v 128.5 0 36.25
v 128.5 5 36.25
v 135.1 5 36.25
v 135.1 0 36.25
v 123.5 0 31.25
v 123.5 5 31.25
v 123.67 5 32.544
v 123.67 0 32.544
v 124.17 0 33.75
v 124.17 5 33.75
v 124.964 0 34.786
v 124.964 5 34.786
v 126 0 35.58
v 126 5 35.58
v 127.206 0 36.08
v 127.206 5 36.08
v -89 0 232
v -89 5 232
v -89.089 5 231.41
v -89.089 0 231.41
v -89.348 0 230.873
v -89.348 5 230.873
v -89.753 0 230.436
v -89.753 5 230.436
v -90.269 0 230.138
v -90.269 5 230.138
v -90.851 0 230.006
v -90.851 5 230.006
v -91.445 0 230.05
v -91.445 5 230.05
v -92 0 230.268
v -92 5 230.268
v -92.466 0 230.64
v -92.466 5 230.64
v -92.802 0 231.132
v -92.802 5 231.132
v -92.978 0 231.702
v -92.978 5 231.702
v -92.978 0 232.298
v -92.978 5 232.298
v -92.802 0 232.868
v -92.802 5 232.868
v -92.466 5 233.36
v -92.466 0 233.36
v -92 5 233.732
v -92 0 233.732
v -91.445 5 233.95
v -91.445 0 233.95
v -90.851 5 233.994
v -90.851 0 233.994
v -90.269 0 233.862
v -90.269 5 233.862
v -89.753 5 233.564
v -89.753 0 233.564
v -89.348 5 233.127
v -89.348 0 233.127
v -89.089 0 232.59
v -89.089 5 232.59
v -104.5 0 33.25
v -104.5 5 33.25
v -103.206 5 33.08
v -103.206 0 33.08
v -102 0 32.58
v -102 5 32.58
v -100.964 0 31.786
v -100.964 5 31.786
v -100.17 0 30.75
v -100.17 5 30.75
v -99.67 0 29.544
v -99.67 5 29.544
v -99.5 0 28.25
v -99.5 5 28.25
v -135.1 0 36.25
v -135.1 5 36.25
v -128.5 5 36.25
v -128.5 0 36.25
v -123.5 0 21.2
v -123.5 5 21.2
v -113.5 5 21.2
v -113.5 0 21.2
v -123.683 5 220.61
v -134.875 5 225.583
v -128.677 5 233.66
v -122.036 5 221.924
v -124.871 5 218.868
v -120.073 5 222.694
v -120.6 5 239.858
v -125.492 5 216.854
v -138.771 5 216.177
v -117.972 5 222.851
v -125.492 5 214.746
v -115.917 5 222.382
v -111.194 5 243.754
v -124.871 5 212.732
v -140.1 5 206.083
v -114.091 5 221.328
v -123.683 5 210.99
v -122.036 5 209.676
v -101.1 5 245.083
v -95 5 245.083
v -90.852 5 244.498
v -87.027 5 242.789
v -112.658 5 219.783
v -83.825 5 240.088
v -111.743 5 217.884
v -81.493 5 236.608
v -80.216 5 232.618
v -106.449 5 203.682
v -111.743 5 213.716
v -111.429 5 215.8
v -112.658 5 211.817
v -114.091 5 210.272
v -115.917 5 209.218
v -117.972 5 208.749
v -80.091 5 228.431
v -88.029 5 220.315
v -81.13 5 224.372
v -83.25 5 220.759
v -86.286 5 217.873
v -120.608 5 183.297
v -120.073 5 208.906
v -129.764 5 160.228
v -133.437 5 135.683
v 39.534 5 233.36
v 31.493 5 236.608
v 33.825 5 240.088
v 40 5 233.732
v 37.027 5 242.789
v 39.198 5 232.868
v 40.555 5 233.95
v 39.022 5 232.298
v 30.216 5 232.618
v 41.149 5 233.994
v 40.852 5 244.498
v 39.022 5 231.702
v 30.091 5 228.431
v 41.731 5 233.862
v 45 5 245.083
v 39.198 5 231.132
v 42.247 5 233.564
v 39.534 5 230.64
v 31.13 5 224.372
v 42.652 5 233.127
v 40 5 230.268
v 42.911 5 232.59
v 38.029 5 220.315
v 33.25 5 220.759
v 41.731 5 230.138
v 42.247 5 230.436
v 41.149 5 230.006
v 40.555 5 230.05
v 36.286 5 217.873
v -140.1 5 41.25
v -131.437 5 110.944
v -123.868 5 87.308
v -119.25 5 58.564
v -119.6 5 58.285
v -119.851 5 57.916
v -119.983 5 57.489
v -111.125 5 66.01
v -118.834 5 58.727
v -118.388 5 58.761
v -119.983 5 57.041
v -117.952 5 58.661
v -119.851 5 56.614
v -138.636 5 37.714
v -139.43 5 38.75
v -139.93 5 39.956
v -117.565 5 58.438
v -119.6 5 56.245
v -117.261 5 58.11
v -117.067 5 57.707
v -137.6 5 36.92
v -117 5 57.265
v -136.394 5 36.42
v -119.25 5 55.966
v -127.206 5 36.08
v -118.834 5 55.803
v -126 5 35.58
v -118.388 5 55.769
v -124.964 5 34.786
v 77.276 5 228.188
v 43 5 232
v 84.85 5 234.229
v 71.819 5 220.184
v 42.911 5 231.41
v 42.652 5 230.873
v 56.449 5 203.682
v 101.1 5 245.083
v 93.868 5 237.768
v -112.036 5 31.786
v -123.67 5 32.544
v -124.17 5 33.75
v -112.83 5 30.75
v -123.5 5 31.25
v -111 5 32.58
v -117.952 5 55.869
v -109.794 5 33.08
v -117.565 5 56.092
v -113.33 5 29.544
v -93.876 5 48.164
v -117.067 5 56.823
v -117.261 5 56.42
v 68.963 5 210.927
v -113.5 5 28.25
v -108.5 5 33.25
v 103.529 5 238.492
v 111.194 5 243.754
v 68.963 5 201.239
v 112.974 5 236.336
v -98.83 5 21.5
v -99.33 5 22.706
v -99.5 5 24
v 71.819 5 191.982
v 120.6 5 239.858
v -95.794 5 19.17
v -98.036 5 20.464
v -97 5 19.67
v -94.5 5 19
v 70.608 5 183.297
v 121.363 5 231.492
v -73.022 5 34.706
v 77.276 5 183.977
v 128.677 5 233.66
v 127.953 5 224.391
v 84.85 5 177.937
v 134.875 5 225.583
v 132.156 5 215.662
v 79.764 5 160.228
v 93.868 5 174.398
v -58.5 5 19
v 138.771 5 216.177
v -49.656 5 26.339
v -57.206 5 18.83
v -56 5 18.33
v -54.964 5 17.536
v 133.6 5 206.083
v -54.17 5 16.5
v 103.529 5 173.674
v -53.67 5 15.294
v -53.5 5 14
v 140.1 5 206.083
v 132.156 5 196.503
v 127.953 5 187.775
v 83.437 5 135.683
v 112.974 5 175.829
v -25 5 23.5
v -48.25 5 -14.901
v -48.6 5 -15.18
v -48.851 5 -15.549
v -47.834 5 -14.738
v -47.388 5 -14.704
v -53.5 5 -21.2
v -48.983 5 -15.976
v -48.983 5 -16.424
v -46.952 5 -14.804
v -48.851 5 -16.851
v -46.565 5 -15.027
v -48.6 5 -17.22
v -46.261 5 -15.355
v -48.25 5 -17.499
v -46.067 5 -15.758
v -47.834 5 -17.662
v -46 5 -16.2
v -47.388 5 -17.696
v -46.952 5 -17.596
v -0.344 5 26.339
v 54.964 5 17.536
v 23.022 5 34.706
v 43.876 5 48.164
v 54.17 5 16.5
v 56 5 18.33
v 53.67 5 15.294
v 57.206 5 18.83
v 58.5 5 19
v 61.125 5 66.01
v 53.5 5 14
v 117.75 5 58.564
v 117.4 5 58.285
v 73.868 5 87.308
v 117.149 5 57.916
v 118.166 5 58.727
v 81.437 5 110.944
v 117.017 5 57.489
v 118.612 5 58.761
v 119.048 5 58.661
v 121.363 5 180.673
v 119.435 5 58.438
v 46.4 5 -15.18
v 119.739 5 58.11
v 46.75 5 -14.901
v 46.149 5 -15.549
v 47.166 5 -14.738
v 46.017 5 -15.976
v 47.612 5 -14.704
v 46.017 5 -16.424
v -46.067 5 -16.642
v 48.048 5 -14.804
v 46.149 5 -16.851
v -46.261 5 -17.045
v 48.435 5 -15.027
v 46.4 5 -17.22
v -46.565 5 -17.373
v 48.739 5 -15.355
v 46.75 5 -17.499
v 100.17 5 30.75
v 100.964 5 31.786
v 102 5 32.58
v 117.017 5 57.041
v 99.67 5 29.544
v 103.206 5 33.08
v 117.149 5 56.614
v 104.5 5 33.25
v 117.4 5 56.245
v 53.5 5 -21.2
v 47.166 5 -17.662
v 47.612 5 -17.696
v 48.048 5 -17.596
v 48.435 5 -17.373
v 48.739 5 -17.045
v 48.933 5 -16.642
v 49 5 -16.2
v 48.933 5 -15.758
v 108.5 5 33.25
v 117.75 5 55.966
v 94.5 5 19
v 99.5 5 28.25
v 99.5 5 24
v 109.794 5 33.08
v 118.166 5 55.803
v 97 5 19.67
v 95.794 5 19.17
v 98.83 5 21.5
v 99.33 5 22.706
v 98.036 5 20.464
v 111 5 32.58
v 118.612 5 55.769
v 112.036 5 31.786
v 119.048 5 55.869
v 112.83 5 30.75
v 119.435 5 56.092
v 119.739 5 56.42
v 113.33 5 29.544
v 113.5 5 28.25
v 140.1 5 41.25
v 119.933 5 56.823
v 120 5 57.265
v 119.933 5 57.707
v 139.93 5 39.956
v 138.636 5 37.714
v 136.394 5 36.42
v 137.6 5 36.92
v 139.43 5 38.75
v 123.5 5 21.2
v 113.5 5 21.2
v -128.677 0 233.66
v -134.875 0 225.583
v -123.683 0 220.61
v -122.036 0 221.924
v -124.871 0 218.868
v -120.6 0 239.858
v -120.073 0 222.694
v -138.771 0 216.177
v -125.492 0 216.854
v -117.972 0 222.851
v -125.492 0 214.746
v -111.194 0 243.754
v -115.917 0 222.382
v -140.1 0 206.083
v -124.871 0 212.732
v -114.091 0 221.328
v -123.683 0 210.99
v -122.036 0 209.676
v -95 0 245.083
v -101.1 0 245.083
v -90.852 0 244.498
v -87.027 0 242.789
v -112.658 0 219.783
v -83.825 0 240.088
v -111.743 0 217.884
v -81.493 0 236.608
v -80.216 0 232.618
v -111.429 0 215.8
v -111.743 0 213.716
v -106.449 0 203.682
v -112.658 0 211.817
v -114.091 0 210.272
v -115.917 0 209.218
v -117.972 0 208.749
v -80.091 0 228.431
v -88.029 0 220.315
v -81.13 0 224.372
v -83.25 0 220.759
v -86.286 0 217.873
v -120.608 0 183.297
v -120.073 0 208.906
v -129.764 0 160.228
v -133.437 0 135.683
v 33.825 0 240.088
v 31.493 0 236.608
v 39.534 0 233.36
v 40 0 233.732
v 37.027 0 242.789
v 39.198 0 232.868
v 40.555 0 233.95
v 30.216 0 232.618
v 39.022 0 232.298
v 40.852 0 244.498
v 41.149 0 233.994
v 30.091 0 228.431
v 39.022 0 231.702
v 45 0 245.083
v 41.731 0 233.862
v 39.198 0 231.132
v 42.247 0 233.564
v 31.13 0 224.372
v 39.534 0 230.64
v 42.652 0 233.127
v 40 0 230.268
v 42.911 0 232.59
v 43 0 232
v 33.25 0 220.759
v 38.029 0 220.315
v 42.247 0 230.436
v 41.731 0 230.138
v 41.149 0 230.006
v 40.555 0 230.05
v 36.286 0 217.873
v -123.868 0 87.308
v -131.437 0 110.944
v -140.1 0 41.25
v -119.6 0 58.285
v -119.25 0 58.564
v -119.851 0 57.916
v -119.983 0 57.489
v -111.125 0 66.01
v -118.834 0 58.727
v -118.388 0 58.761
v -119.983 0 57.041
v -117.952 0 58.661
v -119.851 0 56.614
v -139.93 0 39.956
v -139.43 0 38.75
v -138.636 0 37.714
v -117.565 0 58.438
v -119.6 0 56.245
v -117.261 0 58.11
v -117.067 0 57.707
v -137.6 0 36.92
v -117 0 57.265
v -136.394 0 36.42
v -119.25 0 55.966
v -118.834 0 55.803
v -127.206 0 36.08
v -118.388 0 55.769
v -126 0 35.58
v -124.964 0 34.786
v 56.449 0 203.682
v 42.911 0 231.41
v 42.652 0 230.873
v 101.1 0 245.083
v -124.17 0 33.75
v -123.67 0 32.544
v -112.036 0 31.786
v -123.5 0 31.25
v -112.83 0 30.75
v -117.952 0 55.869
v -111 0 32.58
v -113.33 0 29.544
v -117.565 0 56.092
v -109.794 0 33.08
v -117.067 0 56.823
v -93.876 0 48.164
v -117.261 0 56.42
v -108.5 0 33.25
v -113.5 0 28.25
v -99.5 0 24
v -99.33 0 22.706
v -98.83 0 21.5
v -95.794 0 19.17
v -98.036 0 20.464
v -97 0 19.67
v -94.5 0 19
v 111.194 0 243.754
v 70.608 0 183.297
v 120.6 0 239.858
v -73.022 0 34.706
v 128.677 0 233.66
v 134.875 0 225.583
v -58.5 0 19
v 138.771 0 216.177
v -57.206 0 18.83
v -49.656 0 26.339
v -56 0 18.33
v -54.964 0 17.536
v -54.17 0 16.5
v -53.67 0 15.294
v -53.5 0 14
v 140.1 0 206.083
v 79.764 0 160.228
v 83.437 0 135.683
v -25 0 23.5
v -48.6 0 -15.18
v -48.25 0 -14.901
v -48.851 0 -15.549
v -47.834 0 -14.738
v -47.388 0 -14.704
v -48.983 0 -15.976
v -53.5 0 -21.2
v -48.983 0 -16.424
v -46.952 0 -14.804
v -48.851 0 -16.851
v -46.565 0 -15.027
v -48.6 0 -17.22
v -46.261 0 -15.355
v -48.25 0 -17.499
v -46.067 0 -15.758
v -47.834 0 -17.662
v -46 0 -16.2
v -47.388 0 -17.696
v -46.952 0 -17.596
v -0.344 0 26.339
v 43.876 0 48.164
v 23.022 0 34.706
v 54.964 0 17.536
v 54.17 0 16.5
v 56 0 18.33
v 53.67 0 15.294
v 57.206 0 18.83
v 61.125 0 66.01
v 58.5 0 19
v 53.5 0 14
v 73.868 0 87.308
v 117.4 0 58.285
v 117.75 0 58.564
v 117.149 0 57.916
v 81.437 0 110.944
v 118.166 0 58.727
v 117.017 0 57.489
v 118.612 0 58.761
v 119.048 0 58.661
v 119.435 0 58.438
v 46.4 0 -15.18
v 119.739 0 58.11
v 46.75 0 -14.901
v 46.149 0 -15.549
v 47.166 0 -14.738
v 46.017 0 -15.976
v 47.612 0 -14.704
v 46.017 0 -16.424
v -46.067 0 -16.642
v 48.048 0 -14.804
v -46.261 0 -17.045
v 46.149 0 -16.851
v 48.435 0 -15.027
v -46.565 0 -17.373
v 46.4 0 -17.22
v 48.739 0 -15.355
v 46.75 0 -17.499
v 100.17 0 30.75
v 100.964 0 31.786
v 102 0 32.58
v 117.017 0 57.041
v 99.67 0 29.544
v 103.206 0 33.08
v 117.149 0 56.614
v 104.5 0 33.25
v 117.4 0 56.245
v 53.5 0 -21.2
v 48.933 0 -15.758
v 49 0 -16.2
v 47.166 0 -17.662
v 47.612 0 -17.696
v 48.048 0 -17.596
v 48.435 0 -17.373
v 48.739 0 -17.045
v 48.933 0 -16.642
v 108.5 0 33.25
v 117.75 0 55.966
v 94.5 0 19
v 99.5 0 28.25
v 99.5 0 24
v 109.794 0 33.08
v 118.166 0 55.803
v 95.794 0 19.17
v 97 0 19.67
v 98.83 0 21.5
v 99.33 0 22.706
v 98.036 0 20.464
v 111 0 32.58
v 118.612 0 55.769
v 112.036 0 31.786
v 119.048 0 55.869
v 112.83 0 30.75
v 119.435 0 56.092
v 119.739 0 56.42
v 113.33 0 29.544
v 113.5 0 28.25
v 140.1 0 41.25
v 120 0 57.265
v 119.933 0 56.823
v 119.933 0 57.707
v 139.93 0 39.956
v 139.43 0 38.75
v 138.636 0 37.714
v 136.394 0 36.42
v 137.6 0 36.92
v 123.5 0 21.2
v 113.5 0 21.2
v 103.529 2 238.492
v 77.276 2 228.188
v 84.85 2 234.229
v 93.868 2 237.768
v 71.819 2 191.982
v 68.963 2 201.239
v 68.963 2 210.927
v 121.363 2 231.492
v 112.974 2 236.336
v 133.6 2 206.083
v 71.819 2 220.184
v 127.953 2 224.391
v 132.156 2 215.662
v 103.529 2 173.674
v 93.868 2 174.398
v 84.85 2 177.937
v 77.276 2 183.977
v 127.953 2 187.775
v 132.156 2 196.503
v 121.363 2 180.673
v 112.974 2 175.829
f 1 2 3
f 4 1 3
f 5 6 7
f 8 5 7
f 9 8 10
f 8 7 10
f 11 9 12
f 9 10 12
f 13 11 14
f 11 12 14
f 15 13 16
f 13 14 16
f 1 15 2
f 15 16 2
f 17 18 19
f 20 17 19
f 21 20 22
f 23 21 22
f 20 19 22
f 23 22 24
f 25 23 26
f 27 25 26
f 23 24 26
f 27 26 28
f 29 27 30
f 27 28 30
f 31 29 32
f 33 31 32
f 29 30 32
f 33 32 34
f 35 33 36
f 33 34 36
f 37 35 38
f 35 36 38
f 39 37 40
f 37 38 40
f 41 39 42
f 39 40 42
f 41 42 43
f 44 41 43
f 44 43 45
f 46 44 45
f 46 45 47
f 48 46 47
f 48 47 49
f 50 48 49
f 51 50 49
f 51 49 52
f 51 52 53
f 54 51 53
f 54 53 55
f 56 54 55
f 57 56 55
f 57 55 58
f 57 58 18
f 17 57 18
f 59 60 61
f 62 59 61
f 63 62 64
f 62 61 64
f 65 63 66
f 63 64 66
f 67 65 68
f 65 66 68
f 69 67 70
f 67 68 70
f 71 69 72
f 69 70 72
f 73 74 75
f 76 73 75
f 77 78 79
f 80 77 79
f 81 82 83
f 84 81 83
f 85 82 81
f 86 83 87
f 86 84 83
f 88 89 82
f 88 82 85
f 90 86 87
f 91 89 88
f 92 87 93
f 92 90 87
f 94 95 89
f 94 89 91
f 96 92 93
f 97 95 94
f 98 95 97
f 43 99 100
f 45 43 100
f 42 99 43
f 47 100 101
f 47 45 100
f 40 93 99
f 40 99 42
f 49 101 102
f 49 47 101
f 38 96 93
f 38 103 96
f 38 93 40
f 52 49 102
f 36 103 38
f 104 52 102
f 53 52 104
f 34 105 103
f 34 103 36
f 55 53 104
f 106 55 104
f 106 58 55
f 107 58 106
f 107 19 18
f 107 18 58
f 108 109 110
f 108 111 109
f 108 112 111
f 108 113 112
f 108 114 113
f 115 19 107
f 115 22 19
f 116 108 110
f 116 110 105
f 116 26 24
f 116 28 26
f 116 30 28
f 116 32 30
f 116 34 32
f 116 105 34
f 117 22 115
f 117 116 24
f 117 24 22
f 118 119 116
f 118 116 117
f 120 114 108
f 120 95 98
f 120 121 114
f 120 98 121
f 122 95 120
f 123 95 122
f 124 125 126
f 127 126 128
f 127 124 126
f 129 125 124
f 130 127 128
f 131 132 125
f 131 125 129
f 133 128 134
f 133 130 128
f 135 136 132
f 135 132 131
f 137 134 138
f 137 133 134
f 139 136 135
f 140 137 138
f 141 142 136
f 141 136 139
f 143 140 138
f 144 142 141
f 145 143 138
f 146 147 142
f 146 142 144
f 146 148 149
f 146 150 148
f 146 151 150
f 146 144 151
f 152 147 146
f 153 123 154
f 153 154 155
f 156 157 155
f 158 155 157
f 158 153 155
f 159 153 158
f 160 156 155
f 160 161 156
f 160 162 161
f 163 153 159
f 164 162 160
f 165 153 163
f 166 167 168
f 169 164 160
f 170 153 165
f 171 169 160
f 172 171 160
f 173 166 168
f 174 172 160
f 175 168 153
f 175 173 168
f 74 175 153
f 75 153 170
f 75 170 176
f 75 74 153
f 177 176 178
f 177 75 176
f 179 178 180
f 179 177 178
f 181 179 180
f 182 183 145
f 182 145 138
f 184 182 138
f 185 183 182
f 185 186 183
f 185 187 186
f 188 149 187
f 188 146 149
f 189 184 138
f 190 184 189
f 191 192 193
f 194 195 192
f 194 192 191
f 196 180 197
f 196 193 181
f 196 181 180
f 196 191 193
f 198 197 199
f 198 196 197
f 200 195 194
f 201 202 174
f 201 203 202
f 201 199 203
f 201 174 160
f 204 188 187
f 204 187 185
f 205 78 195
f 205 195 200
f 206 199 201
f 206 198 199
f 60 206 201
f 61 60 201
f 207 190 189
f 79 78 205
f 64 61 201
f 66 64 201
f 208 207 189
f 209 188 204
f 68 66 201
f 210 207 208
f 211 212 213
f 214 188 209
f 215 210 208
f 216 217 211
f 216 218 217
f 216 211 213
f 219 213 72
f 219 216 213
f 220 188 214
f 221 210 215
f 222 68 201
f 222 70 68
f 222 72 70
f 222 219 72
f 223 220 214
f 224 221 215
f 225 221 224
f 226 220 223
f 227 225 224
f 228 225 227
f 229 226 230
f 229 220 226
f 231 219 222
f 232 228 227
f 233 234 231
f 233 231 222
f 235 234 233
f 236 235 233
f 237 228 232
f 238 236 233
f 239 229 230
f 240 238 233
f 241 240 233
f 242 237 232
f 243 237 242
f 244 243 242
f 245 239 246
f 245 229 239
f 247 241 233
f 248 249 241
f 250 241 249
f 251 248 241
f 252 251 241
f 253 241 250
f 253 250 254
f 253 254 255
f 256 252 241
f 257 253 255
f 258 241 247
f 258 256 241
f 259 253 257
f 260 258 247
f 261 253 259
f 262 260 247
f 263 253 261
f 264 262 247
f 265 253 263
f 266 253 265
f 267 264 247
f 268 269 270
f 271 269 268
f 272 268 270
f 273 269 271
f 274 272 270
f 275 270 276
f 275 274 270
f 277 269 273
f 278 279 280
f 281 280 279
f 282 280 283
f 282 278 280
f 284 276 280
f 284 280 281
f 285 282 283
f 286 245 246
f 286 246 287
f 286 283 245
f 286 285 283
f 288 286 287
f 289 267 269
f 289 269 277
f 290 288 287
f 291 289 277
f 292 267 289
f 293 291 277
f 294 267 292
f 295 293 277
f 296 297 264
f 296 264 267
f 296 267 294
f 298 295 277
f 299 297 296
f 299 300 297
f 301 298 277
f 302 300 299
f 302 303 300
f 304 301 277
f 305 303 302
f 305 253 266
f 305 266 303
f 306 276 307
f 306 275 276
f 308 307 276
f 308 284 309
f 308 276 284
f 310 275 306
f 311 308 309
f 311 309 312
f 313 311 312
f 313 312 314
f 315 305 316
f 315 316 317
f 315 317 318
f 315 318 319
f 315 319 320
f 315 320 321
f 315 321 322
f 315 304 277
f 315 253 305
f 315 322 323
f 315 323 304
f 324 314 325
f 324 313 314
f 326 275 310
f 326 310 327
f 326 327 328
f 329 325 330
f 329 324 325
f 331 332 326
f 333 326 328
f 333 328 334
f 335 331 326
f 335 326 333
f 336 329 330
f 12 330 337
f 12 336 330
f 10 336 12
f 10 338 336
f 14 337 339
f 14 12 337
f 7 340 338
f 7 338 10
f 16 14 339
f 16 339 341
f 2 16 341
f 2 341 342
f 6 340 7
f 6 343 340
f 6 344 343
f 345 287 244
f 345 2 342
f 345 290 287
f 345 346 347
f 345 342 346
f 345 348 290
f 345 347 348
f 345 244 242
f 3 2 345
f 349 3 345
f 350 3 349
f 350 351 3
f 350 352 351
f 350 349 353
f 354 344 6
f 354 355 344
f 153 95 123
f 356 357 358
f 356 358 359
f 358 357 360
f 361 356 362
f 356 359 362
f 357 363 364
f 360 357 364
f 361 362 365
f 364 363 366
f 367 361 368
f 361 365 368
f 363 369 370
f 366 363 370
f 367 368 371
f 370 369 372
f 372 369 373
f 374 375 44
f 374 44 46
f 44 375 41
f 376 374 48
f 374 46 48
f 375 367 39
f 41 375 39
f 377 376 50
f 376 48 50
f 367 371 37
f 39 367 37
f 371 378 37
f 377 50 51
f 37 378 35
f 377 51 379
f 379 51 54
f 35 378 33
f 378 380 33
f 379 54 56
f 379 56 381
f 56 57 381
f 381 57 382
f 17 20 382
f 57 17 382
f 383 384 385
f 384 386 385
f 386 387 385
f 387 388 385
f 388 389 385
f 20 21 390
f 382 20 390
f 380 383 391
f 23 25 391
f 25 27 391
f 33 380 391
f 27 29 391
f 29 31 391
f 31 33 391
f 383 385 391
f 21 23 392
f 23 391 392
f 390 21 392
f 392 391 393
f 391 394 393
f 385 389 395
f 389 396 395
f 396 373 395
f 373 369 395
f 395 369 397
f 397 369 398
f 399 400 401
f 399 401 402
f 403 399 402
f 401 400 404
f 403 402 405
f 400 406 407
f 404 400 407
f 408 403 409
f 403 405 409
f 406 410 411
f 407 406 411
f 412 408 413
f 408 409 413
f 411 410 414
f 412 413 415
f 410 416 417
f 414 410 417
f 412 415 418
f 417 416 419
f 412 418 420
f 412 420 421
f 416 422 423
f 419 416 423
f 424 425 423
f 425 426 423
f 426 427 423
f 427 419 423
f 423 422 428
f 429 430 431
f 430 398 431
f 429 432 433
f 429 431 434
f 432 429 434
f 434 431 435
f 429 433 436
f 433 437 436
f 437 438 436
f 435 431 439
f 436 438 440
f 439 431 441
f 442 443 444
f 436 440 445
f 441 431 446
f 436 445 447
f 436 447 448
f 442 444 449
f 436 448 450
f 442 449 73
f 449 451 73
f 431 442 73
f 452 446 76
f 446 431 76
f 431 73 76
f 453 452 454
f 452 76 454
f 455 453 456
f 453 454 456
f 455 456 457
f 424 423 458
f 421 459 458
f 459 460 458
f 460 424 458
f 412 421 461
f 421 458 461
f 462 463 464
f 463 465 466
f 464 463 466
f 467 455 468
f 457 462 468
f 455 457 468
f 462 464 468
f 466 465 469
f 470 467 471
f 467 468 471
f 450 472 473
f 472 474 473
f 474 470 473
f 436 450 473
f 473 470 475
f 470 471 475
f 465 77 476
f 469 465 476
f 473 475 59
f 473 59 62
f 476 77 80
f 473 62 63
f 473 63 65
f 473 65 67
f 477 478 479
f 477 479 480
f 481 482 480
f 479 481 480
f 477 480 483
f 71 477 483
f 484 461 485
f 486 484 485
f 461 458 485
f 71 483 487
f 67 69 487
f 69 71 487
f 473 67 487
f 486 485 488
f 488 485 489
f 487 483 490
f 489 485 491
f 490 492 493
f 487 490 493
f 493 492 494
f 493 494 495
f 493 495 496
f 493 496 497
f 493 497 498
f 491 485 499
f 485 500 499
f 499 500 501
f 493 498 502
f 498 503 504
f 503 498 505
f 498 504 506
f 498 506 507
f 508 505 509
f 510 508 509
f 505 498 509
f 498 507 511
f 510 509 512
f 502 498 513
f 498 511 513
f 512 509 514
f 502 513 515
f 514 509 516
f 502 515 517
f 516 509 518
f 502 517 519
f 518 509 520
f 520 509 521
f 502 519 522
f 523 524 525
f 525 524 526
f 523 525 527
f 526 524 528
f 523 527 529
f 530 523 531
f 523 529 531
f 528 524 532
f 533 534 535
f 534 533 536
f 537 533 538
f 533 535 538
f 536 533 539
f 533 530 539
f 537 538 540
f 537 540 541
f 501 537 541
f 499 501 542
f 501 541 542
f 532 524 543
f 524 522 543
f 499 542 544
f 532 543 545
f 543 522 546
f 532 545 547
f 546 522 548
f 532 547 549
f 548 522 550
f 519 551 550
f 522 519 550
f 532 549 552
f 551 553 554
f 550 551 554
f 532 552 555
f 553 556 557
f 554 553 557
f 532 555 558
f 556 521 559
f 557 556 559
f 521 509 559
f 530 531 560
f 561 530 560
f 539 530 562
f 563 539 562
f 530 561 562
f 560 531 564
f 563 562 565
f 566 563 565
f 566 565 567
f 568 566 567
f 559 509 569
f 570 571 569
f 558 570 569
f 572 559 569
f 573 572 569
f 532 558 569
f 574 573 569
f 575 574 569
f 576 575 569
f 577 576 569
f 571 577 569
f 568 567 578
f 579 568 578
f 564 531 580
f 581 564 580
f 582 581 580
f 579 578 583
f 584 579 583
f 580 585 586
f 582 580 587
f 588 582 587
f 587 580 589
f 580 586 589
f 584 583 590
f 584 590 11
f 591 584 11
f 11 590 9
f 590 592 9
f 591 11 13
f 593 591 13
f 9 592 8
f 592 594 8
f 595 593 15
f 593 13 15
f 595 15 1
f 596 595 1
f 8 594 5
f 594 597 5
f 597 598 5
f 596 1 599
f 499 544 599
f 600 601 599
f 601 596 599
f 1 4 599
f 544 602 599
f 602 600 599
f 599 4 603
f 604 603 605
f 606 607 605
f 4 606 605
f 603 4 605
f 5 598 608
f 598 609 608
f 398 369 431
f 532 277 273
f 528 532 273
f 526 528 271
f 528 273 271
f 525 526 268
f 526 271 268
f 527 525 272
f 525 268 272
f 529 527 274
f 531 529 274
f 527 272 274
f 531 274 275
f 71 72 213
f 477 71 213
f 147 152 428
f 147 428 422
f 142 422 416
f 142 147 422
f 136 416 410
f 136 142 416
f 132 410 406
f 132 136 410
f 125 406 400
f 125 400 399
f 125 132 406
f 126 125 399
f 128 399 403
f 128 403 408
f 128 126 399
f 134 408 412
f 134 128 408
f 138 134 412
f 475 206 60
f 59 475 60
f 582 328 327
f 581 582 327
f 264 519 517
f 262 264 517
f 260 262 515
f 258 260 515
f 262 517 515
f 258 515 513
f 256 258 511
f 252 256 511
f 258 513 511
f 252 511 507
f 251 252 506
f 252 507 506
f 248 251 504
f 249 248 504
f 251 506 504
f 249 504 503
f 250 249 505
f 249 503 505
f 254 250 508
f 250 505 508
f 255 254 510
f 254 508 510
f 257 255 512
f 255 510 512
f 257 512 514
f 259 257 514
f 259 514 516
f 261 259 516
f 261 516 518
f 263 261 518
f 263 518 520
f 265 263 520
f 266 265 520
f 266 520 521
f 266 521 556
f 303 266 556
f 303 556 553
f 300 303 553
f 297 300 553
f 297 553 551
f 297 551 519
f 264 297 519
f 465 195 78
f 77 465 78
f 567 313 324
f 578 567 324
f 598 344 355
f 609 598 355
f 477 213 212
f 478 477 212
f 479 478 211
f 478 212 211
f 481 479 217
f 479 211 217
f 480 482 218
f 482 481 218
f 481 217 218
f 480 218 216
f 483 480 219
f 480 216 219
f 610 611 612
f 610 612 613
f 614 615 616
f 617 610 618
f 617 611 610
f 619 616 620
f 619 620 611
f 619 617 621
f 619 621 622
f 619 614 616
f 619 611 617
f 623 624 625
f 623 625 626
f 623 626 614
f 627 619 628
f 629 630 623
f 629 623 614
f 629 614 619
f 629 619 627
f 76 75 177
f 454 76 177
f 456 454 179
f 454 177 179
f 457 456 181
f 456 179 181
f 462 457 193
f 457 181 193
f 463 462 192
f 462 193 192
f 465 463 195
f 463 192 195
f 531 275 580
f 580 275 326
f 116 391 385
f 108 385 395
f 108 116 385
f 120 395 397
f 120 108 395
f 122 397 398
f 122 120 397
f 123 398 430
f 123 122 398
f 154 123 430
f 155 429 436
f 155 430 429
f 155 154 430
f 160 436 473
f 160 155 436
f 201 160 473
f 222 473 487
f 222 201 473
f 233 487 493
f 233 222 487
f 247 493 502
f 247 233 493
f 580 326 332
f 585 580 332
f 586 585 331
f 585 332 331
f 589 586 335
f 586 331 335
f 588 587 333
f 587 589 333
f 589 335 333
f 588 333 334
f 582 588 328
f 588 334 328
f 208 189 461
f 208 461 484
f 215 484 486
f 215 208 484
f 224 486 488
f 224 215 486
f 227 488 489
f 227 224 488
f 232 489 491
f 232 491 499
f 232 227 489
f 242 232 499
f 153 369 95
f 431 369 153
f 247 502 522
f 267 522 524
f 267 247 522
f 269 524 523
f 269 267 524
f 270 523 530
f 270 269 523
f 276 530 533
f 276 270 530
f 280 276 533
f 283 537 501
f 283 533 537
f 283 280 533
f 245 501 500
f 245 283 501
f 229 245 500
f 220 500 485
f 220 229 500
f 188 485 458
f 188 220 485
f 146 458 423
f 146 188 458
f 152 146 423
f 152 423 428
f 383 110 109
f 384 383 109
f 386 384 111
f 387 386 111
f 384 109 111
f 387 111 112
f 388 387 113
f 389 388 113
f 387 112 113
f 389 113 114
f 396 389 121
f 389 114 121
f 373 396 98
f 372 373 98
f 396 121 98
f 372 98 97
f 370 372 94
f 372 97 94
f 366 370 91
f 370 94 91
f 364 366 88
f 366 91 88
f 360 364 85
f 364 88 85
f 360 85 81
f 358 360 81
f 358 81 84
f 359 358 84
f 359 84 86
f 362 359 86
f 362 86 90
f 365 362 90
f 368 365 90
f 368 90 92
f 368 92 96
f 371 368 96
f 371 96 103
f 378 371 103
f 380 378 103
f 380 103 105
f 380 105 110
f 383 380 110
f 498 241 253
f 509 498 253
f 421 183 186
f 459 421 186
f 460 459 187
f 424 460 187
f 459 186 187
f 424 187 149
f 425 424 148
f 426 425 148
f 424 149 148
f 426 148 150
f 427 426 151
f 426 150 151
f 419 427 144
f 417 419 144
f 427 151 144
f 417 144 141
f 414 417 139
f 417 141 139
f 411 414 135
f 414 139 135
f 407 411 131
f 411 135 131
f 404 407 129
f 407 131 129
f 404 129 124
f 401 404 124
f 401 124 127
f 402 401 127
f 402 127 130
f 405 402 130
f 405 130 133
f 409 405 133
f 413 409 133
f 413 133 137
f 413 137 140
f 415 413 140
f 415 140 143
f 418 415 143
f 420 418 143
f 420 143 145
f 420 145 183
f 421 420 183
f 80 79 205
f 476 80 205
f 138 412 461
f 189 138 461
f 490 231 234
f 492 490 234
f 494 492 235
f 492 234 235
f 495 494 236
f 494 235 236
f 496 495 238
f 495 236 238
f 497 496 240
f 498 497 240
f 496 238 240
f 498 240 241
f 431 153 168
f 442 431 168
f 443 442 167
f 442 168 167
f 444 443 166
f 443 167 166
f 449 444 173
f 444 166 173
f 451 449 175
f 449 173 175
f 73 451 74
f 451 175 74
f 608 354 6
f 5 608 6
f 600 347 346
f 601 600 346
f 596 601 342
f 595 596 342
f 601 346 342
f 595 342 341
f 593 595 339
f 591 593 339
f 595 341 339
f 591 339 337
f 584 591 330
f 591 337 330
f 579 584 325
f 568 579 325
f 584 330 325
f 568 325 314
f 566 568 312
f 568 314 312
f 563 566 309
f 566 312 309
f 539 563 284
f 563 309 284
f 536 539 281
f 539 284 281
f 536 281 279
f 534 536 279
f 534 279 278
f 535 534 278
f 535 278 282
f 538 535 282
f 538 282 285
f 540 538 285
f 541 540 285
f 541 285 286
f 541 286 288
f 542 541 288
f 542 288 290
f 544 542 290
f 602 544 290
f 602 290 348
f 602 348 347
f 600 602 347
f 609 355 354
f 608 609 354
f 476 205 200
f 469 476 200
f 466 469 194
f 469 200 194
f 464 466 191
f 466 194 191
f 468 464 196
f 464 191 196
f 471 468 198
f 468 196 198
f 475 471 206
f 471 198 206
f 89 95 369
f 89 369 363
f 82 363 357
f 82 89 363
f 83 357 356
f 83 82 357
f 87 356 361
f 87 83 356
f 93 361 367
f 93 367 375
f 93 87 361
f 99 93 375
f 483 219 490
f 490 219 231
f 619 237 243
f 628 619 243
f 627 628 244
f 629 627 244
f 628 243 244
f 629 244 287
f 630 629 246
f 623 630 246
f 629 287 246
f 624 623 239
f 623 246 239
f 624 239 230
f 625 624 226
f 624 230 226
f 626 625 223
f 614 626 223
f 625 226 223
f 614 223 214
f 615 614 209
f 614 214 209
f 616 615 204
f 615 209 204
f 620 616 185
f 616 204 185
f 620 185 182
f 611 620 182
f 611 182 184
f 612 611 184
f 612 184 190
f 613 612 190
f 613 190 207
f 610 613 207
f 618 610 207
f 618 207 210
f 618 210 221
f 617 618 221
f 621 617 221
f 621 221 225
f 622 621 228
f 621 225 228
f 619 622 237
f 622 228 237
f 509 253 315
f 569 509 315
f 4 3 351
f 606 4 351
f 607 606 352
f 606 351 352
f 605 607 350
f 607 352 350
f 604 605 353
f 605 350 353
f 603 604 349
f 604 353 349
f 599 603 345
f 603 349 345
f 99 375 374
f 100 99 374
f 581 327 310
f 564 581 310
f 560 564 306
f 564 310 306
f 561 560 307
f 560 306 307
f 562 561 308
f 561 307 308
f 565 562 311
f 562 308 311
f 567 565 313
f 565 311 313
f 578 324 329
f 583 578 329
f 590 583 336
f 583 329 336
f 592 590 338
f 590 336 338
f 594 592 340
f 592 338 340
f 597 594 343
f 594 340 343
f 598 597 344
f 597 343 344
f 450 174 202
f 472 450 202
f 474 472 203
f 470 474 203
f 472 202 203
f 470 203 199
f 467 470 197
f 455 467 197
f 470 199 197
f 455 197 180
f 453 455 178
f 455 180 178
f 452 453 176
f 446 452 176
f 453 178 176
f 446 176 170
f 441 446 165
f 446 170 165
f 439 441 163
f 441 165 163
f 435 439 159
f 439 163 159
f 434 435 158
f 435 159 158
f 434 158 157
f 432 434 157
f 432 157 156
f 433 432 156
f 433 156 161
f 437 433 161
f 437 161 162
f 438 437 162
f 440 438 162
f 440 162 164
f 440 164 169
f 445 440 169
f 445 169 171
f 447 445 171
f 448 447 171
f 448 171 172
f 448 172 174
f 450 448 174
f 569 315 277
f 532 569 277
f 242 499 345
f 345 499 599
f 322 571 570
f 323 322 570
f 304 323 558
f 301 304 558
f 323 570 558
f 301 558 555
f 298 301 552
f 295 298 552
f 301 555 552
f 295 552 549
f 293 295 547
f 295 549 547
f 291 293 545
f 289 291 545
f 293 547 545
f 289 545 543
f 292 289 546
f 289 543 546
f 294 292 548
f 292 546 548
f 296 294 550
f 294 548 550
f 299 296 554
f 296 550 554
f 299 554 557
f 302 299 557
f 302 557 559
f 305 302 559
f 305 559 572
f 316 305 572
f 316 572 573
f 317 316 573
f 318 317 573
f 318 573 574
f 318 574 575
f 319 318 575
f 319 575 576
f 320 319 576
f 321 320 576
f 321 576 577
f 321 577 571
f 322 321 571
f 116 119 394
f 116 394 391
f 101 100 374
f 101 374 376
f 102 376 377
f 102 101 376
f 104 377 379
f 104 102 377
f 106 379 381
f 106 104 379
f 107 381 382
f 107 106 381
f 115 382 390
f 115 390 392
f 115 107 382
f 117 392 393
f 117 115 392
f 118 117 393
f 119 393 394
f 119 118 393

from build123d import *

# Parameters (mm, degrees)
ESQUISSE1_W              = 280.2
ESQUISSE1_H              = 276.282873123
BOSS_EXTRU_1_DEPTH       = 5
ENL_V_MAT_EXTRU_1_DEPTH  = 6
ENL_V_MAT_EXTRU_3_DEPTH  = 6
ESQUISSE5_R              = 2
ENL_V_MAT_EXTRU_4_DEPTH  = 6
ENL_V_MAT_EXTRU_5_DEPTH  = 6
ESQUISSE7_R              = 7.071067812
ENL_V_MAT_EXTRU_6_DEPTH  = 6
ESQUISSE8_R              = 1.5
ENL_V_MAT_EXTRU_8_DEPTH  = 6
ESQUISSE9_R              = 32.5
ENL_V_MAT_EXTRU_10_DEPTH = 3
ESQUISSE10_R             = 1.5
ENL_V_MAT_EXTRU_11_DEPTH = 6


with BuildPart() as part:
    # Esquisse1 → Boss.-Extru.1 (new body)
    with BuildSketch(Plane(origin=(0, 0, 0), x_dir=(1, 0, 0), z_dir=(0, 1, 0))):
        with Locations((0, -106.941436562)):
            Rectangle(ESQUISSE1_W, ESQUISSE1_H)
    extrude(amount=BOSS_EXTRU_1_DEPTH)

    # Esquisse2 → Enlèv. mat.-Extru.1 (cut, through all)
    with BuildSketch(Plane(origin=(0, 5, 0), x_dir=(1, 0, 0), z_dir=(0, 1, 0))):
        with BuildLine():
            Line((-86.286307054, -217.873386842), (-88.029045643, -220.315284098))
            ThreePointArc((-88.029045643, -220.315284098), (-128.330678708, -98.90890093), (-25, -23.5))
            ThreePointArc((-25, -23.5), (78.330678708, -98.90890093), (38.029045643, -220.315284098))
            Line((38.029045643, -220.315284098), (36.286307054, -217.873386842))
            ThreePointArc((36.286307054, -217.873386842), (30.714652713, -234.657679446), (45, -245.082873123))
            Line((45, -245.082873123), (-95, -245.082873123))
            ThreePointArc((-95, -245.082873123), (-80.714652713, -234.657679446), (-86.286307054, -217.873386842))
        make_face()
    extrude(amount=-ENL_V_MAT_EXTRU_1_DEPTH, mode=Mode.SUBTRACT)

    # Esquisse4 → Enlèv. mat.-Extru.3 (cut, through all)
    with BuildSketch(Plane(origin=(0, 5, 0), x_dir=(1, 0, 0), z_dir=(0, 1, 0))):
        with BuildLine():
            Line((140.1, -245.082873123), (101.1, -245.082873123))
            ThreePointArc((101.1, -245.082873123), (128.677164466, -233.660037589), (140.1, -206.082873123))
            Line((140.1, -206.082873123), (140.1, -245.082873123))
        make_face()
        with BuildLine():
            Line((-101.1, -245.082873123), (-140.1, -245.082873123))
            Line((-140.1, -245.082873123), (-140.1, -206.082873123))
            ThreePointArc((-140.1, -206.082873123), (-128.677164466, -233.660037589), (-101.1, -245.082873123))
        make_face()
    extrude(amount=-ENL_V_MAT_EXTRU_3_DEPTH, mode=Mode.SUBTRACT)

    # Esquisse5 → Enlèv. mat.-Extru.4 (cut, through all)
    with BuildSketch(Plane(origin=(0, 5, 0), x_dir=(1, 0, 0), z_dir=(0, 1, 0))):
        with Locations((-91, -232)):
            Circle(ESQUISSE5_R)
        with Locations((41, -232)):
            Circle(ESQUISSE5_R)
    extrude(amount=-ENL_V_MAT_EXTRU_4_DEPTH, mode=Mode.SUBTRACT)

    # Esquisse6 → Enlèv. mat.-Extru.5 (cut, through all)
    with BuildSketch(Plane(origin=(0, 5, 0), x_dir=(1, 0, 0), z_dir=(0, 1, 0))):
        with BuildLine():
            Line((140.1, 31.2), (0, 31.2))
            Line((0, 31.2), (-140.1, 31.2))
            Line((-140.1, 31.2), (-140.1, -41.25))
            ThreePointArc((-140.1, -41.25), (-138.635533906, -37.714466094), (-135.1, -36.25))
            Line((-135.1, -36.25), (-128.5, -36.25))
            ThreePointArc((-128.5, -36.25), (-124.964466094, -34.785533906), (-123.5, -31.25))
            Line((-123.5, -31.25), (-123.5, -21.2))
            Line((-123.5, -21.2), (-113.5, -21.2))
            Line((-113.5, -21.2), (-113.5, -28.25))
            ThreePointArc((-113.5, -28.25), (-112.035533906, -31.785533906), (-108.5, -33.25))
            Line((-108.5, -33.25), (-104.5, -33.25))
            ThreePointArc((-104.5, -33.25), (-100.964466094, -31.785533906), (-99.5, -28.25))
            Line((-99.5, -28.25), (-99.5, -24))
            ThreePointArc((-99.5, -24), (-98.035533906, -20.464466094), (-94.5, -19))
            Line((-94.5, -19), (-58.5, -19))
            ThreePointArc((-58.5, -19), (-54.964466094, -17.535533906), (-53.5, -14))
            Line((-53.5, -14), (-53.5, 21.2))
            Line((-53.5, 21.2), (53.5, 21.2))
            Line((53.5, 21.2), (53.5, -14))
            ThreePointArc((53.5, -14), (54.964466094, -17.535533906), (58.5, -19))
            Line((58.5, -19), (94.5, -19))
            ThreePointArc((94.5, -19), (98.035533906, -20.464466094), (99.5, -24))
            Line((99.5, -24), (99.5, -28.25))
            ThreePointArc((99.5, -28.25), (100.964466094, -31.785533906), (104.5, -33.25))
            Line((104.5, -33.25), (108.5, -33.25))
            ThreePointArc((108.5, -33.25), (112.035533906, -31.785533906), (113.5, -28.25))
            Line((113.5, -28.25), (113.5, -21.2))
            Line((113.5, -21.2), (123.5, -21.2))
            Line((123.5, -21.2), (123.5, -31.25))
            ThreePointArc((123.5, -31.25), (124.964466094, -34.785533906), (128.5, -36.25))
            Line((128.5, -36.25), (135.1, -36.25))
            ThreePointArc((135.1, -36.25), (138.635533906, -37.714466094), (140.1, -41.25))
            Line((140.1, -41.25), (140.1, 31.2))
        make_face()
    extrude(amount=-ENL_V_MAT_EXTRU_5_DEPTH, mode=Mode.SUBTRACT)

    # Esquisse7 → Enlèv. mat.-Extru.6 (cut, through all)
    with BuildSketch(Plane(origin=(0, 5, 0), x_dir=(1, 0, 0), z_dir=(0, 1, 0))):
        with Locations((-118.5, -215.8)):
            Circle(ESQUISSE7_R)
    extrude(amount=-ENL_V_MAT_EXTRU_6_DEPTH, mode=Mode.SUBTRACT)

    # Esquisse8 → Enlèv. mat.-Extru.8 (cut, through all)
    with BuildSketch(Plane.XZ):
        with Locations((47.5, -16.2)):
            Circle(ESQUISSE8_R)
        with Locations((-47.5, -16.2)):
            Circle(ESQUISSE8_R)
    extrude(amount=-ENL_V_MAT_EXTRU_8_DEPTH, mode=Mode.SUBTRACT)

    # Esquisse9 → Enlèv. mat.-Extru.10 (cut)
    with BuildSketch(Plane(origin=(0, 5, 0), x_dir=(1, 0, 0), z_dir=(0, 1, 0))):
        with Locations((101.1, -206.082873123)):
            Circle(ESQUISSE9_R)
    extrude(amount=-ENL_V_MAT_EXTRU_10_DEPTH, mode=Mode.SUBTRACT)

    # Esquisse10 → Enlèv. mat.-Extru.11 (cut, through all)
    with BuildSketch(Plane(origin=(0, 5, 0), x_dir=(1, 0, 0), z_dir=(0, 1, 0))):
        with Locations((118.5, -57.265046493)):
            Circle(ESQUISSE10_R)
        with Locations((-118.5, -57.265046493)):
            Circle(ESQUISSE10_R)
    extrude(amount=-ENL_V_MAT_EXTRU_11_DEPTH, mode=Mode.SUBTRACT)


solid = part.part
